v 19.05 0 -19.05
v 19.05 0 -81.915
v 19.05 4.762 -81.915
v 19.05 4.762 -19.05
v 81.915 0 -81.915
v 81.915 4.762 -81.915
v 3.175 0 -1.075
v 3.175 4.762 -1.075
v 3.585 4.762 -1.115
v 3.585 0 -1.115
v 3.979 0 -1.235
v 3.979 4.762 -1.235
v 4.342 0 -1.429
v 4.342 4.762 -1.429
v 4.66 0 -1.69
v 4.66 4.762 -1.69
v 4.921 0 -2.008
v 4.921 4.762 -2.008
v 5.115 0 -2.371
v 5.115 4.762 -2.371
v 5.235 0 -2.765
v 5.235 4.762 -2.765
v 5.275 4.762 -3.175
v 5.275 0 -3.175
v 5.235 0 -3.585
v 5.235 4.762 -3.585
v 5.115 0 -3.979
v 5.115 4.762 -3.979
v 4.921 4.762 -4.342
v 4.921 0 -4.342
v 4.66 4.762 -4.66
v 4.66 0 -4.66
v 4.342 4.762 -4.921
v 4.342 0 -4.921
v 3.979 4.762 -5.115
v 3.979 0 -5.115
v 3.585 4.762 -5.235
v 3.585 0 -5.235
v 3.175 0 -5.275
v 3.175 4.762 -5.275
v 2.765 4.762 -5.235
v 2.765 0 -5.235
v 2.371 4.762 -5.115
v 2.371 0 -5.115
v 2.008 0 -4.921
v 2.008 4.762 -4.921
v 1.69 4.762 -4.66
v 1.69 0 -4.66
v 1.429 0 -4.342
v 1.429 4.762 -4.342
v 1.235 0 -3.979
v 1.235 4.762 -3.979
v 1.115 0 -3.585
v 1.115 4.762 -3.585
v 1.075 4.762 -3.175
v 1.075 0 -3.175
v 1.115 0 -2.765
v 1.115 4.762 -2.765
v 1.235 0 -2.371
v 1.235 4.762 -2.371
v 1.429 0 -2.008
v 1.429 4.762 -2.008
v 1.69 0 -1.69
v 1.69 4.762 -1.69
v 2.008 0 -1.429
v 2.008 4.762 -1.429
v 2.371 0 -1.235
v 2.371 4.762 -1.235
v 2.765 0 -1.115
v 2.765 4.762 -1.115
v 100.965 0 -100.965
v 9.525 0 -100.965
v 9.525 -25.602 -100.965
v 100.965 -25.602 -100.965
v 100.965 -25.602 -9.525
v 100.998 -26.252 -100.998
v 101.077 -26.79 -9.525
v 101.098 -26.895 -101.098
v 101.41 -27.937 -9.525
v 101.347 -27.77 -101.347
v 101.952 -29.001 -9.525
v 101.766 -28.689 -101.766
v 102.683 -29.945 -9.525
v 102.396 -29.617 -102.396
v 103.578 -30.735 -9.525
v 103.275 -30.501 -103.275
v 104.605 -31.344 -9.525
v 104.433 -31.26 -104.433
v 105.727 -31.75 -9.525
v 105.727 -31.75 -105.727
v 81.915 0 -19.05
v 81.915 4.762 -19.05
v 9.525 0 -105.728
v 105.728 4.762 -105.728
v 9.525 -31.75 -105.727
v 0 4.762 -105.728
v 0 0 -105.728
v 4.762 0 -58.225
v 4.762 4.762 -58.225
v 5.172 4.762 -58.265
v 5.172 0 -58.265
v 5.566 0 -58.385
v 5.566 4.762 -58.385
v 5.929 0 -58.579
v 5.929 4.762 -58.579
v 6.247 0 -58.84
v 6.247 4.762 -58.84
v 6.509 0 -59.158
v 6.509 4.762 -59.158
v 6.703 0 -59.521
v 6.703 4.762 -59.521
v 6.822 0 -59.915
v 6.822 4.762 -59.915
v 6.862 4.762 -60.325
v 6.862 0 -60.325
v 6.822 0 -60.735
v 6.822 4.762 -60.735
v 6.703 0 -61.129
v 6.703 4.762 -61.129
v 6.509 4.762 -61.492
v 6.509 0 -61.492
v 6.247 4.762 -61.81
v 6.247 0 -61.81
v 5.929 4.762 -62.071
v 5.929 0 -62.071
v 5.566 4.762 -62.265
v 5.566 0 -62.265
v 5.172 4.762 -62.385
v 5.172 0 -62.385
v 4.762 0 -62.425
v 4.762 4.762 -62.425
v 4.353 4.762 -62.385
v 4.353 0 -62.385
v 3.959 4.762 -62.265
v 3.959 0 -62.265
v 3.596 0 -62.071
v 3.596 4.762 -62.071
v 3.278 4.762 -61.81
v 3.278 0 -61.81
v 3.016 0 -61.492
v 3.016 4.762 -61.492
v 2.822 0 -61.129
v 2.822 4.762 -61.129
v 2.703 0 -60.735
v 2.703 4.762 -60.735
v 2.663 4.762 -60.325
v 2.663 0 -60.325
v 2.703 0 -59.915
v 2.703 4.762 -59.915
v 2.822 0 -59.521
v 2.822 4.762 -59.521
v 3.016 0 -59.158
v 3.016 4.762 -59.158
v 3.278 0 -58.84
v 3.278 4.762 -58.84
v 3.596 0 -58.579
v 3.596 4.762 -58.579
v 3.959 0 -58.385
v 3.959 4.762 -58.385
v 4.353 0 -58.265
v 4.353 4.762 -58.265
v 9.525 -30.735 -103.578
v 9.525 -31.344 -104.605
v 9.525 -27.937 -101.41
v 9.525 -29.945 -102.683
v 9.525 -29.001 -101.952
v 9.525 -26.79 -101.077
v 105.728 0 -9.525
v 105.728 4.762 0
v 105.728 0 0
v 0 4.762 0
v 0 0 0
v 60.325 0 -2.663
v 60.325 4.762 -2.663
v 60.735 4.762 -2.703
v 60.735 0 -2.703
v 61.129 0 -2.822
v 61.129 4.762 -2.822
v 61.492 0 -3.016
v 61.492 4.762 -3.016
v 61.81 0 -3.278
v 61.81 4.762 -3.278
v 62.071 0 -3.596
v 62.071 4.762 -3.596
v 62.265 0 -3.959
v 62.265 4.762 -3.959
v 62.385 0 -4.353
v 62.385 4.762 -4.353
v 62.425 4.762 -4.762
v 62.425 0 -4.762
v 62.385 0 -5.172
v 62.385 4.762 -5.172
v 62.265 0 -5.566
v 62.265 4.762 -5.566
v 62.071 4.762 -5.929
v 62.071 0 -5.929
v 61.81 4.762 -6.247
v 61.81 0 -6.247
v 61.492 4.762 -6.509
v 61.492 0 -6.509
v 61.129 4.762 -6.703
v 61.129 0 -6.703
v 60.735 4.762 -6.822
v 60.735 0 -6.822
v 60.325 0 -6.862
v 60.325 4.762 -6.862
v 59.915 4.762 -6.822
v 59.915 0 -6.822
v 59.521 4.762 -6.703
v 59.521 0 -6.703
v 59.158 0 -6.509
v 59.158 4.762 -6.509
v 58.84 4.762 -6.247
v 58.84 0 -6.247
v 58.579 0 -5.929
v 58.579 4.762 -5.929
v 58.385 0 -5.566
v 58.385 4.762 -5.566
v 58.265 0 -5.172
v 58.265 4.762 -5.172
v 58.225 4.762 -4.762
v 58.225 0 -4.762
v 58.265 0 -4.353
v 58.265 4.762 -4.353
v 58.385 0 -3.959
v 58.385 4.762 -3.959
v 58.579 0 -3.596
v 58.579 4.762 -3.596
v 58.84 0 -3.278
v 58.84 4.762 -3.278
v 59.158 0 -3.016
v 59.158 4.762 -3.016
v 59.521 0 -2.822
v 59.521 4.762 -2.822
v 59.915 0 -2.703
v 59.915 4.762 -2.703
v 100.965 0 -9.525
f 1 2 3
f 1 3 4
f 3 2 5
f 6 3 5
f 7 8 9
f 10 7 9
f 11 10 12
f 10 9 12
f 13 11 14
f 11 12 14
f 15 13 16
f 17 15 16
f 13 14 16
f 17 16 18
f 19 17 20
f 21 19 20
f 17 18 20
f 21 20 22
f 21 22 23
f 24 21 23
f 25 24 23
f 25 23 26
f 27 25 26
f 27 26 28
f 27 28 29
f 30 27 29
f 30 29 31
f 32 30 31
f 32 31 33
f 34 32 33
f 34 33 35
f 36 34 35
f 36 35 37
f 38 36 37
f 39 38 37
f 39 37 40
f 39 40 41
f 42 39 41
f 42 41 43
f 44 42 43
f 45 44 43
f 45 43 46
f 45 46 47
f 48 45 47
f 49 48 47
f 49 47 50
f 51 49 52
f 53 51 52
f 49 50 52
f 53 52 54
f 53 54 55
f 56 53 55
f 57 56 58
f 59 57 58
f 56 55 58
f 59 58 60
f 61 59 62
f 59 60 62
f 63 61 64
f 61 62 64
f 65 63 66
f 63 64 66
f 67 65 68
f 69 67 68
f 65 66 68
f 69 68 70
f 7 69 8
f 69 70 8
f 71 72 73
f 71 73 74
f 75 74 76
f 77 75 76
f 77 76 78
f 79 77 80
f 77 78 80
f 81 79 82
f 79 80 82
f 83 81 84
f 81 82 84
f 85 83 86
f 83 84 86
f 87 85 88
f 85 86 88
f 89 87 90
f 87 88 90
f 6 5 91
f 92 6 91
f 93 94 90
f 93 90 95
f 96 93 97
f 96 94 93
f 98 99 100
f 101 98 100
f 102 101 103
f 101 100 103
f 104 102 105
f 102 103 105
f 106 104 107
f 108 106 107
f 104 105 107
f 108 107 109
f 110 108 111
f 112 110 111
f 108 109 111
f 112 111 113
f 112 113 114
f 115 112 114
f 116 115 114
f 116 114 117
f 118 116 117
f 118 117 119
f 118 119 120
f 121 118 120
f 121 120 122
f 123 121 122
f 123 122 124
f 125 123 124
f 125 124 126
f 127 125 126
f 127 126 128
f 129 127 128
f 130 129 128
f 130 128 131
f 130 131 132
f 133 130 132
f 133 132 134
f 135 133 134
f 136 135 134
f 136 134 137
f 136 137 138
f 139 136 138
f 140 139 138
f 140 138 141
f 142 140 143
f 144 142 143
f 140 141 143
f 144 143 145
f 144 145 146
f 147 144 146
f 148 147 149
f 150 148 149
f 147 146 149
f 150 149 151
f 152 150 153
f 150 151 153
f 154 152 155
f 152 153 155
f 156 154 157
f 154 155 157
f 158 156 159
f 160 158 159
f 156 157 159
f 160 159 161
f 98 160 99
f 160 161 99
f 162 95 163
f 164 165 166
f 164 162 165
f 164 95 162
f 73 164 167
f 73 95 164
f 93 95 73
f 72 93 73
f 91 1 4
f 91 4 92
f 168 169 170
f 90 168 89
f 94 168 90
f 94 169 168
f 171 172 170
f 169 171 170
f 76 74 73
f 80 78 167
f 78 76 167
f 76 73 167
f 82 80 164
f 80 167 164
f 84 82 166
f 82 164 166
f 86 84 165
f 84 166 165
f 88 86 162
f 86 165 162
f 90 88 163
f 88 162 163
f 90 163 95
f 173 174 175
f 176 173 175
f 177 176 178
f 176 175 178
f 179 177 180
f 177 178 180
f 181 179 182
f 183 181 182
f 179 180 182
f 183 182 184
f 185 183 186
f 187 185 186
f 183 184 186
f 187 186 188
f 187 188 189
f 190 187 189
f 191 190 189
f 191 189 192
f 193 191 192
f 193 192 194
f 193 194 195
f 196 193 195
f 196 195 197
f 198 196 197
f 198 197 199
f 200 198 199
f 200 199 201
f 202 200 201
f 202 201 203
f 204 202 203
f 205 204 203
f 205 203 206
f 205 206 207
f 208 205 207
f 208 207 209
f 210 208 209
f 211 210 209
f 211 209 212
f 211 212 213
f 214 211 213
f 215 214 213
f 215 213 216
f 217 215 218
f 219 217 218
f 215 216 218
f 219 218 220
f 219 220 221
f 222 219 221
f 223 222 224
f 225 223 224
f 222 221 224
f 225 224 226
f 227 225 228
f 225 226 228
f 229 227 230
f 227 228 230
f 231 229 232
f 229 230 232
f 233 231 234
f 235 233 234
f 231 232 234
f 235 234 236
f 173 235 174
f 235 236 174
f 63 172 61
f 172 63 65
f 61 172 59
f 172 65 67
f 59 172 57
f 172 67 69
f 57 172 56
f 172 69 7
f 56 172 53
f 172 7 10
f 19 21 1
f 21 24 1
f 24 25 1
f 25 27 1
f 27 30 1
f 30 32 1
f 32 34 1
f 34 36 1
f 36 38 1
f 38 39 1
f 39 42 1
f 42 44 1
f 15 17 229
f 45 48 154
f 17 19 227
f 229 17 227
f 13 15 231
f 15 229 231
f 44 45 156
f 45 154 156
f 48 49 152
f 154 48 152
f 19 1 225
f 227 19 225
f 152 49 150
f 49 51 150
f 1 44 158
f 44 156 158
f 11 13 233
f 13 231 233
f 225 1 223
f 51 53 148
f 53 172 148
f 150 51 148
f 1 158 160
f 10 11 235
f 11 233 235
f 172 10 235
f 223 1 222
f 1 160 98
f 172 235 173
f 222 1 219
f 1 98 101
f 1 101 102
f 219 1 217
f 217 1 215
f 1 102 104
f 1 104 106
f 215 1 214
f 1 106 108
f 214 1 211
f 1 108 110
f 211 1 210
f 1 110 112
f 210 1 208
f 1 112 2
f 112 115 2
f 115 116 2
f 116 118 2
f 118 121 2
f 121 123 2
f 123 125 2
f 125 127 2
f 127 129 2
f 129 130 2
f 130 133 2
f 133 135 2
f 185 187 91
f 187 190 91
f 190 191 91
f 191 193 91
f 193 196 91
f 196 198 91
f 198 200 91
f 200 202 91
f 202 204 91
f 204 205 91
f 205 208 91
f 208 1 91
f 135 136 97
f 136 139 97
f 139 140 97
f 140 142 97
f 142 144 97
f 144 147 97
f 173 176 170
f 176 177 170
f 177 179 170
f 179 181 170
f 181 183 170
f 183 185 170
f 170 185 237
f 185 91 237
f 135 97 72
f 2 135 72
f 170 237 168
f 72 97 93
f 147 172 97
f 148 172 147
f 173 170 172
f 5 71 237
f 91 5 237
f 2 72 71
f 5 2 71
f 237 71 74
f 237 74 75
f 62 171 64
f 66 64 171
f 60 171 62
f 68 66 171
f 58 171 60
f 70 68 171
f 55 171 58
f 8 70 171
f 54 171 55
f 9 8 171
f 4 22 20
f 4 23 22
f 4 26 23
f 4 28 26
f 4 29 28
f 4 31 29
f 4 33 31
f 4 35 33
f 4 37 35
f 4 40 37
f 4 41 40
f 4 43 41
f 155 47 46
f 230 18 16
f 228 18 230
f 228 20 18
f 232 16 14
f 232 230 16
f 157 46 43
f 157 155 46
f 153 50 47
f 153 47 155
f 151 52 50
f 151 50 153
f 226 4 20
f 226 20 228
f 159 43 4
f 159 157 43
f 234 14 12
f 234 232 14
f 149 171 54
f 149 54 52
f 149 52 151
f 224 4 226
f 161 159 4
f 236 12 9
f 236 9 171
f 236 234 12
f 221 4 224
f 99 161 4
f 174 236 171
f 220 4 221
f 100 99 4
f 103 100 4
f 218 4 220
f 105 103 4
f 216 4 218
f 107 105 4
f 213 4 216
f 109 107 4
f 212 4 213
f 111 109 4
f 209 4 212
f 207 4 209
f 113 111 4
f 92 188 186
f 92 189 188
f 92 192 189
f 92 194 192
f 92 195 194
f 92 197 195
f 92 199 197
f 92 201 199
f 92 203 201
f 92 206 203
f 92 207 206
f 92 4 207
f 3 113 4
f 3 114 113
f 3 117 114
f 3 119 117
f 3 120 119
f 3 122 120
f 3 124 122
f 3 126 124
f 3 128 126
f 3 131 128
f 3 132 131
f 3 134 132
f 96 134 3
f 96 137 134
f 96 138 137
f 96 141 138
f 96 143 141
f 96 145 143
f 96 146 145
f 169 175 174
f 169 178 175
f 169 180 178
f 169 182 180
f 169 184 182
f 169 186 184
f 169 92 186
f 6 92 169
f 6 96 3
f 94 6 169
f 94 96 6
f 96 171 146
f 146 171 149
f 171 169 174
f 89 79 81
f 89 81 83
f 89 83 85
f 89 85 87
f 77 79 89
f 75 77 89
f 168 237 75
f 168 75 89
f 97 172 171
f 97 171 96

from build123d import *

# Parameters (mm, degrees)
SKETCH2_W           = 105.7275
SKETCH2_H           = 105.7275
BOSS_EXTRUDE1_DEPTH = 4.7625
BOSS_EXTRUDE2_DEPTH = 31.75
SKETCH6_R           = 2.099999991
CUT_EXTRUDE1_DEPTH  = 154.914817899
FILLET1_R           = 6.35
SKETCH7_W           = 62.865
SKETCH7_H           = 62.865
CUT_EXTRUDE2_DEPTH  = 153.855065381


with BuildPart() as part:
    # Sketch2 → Boss-Extrude1 (new body)
    with BuildSketch(Plane(origin=(0, 0, 0), x_dir=(1, 0, 0), z_dir=(0, 1, 0))):
        with Locations((52.86375, 52.86375)):
            Rectangle(SKETCH2_W, SKETCH2_H)
    extrude(amount=BOSS_EXTRUDE1_DEPTH)

    # Sketch5 → Boss-Extrude2 (add)
    with BuildSketch(Plane(origin=(0, 0, 0), x_dir=(1, 0, 0), z_dir=(0, 1, 0))):
        Polygon((105.7275, 9.525), (105.7275, 105.7275), (9.525, 105.7275), (9.525, 100.965), (100.965, 100.965), (100.965, 9.525), align=None)
    extrude(amount=-BOSS_EXTRUDE2_DEPTH)

    # Sketch6 → Cut-Extrude1 (cut, through all)
    with BuildSketch(Plane(origin=(0, 4.7625, 0), x_dir=(1, 0, 0), z_dir=(0, 1, 0))):
        with Locations(Location((3.175, 3.175, 0), (0, 0, 270))):
            Circle(SKETCH6_R)
        with Locations(Location((60.325, 4.7625, 0), (0, 0, 270))):
            Circle(SKETCH6_R)
        with Locations(Location((4.7625, 60.325, 0), (0, 0, 270))):
            Circle(SKETCH6_R)
    extrude(amount=-CUT_EXTRUDE1_DEPTH, mode=Mode.SUBTRACT)

    # Fillet1
    # the kernel refuses this fillet: 6.35 mm, written as the material it takes off along each edge
    with BuildSketch(Plane(origin=(9.525, -31.75, -100.965), x_dir=(0, 0, -1), z_dir=(1, 0, 0)), Plane(origin=(100.965, -31.75, -100.965), x_dir=(1, 0, 0), z_dir=(0, 0, 1))) as fillet1_piece_1:
        with BuildLine():
            CenterArc((6.35, 6.148361062), FILLET1_R, 180, 75.522487814)
            Line((0, 6.148361062), (-0.127, 6.148361062))
            Line((-0.127, 6.148361062), (-0.127, 0))
            Line((-0.127, 0), (0, -0.127))
            ThreePointArc((0, -0.127), (2.38125, -0.127), (4.73075, -0.122967221))
            Line((4.73075, -0.122967221), (4.7625, 0))
        make_face()
    extrude(amount=91.44, mode=Mode.SUBTRACT)
    with BuildSketch(Plane(origin=(9.525, -31.75, -100.965), x_dir=(0, 0, -1), z_dir=(1, 0, 0))) as fillet1_piece_2a_section:
        with BuildLine():
            CenterArc((6.35, 6.148361062), FILLET1_R, 180, 75.522487814)
            Line((0, 6.148361062), (-0.127, 6.148361062))
            Line((-0.127, 6.148361062), (-0.127, 0))
            Line((-0.127, 0), (0, -0.127))
            ThreePointArc((0, -0.127), (2.38125, -0.127), (4.73075, -0.122967221))
            Line((4.73075, -0.122967221), (4.7625, 0))
        make_face()
    fillet1_piece_2a = extrude(amount=106.810902655, mode=Mode.PRIVATE)
    fillet1_piece_2a = split(fillet1_piece_2a, bisect_by=Plane(origin=(100.965, -30.30128496, -102.168907648), z_dir=(1, 0, 0)), keep=Keep.TOP, mode=Mode.PRIVATE)
    with BuildSketch(Plane(origin=(100.965, -31.75, -116.335902655), x_dir=(1, 0, 0), z_dir=(0, 0, 1))) as fillet1_piece_2b_section:
        with BuildLine():
            CenterArc((6.35, 6.148361062), FILLET1_R, 180, 75.522487814)
            Line((0, 6.148361062), (-0.127, 6.148361062))
            Line((-0.127, 6.148361062), (-0.127, 0))
            Line((-0.127, 0), (0, -0.127))
            ThreePointArc((0, -0.127), (2.38125, -0.127), (4.73075, -0.122967221))
            Line((4.73075, -0.122967221), (4.7625, 0))
        make_face()
    fillet1_piece_2b = extrude(amount=106.810902655, mode=Mode.PRIVATE)
    fillet1_piece_2b = split(fillet1_piece_2b, bisect_by=Plane(origin=(102.168907648, -30.30128496, -100.965), z_dir=(0, 0, -1)), keep=Keep.TOP, mode=Mode.PRIVATE)
    fillet1_piece_2 = fillet1_piece_2a & fillet1_piece_2b
    add(fillet1_piece_2, mode=Mode.SUBTRACT)

    # Sketch7 → Cut-Extrude2 (cut, through all)
    with BuildSketch(Plane.XZ):
        with Locations((50.4825, -50.4825)):
            Rectangle(SKETCH7_W, SKETCH7_H)
    extrude(amount=-CUT_EXTRUDE2_DEPTH, mode=Mode.SUBTRACT)


solid = part.part
